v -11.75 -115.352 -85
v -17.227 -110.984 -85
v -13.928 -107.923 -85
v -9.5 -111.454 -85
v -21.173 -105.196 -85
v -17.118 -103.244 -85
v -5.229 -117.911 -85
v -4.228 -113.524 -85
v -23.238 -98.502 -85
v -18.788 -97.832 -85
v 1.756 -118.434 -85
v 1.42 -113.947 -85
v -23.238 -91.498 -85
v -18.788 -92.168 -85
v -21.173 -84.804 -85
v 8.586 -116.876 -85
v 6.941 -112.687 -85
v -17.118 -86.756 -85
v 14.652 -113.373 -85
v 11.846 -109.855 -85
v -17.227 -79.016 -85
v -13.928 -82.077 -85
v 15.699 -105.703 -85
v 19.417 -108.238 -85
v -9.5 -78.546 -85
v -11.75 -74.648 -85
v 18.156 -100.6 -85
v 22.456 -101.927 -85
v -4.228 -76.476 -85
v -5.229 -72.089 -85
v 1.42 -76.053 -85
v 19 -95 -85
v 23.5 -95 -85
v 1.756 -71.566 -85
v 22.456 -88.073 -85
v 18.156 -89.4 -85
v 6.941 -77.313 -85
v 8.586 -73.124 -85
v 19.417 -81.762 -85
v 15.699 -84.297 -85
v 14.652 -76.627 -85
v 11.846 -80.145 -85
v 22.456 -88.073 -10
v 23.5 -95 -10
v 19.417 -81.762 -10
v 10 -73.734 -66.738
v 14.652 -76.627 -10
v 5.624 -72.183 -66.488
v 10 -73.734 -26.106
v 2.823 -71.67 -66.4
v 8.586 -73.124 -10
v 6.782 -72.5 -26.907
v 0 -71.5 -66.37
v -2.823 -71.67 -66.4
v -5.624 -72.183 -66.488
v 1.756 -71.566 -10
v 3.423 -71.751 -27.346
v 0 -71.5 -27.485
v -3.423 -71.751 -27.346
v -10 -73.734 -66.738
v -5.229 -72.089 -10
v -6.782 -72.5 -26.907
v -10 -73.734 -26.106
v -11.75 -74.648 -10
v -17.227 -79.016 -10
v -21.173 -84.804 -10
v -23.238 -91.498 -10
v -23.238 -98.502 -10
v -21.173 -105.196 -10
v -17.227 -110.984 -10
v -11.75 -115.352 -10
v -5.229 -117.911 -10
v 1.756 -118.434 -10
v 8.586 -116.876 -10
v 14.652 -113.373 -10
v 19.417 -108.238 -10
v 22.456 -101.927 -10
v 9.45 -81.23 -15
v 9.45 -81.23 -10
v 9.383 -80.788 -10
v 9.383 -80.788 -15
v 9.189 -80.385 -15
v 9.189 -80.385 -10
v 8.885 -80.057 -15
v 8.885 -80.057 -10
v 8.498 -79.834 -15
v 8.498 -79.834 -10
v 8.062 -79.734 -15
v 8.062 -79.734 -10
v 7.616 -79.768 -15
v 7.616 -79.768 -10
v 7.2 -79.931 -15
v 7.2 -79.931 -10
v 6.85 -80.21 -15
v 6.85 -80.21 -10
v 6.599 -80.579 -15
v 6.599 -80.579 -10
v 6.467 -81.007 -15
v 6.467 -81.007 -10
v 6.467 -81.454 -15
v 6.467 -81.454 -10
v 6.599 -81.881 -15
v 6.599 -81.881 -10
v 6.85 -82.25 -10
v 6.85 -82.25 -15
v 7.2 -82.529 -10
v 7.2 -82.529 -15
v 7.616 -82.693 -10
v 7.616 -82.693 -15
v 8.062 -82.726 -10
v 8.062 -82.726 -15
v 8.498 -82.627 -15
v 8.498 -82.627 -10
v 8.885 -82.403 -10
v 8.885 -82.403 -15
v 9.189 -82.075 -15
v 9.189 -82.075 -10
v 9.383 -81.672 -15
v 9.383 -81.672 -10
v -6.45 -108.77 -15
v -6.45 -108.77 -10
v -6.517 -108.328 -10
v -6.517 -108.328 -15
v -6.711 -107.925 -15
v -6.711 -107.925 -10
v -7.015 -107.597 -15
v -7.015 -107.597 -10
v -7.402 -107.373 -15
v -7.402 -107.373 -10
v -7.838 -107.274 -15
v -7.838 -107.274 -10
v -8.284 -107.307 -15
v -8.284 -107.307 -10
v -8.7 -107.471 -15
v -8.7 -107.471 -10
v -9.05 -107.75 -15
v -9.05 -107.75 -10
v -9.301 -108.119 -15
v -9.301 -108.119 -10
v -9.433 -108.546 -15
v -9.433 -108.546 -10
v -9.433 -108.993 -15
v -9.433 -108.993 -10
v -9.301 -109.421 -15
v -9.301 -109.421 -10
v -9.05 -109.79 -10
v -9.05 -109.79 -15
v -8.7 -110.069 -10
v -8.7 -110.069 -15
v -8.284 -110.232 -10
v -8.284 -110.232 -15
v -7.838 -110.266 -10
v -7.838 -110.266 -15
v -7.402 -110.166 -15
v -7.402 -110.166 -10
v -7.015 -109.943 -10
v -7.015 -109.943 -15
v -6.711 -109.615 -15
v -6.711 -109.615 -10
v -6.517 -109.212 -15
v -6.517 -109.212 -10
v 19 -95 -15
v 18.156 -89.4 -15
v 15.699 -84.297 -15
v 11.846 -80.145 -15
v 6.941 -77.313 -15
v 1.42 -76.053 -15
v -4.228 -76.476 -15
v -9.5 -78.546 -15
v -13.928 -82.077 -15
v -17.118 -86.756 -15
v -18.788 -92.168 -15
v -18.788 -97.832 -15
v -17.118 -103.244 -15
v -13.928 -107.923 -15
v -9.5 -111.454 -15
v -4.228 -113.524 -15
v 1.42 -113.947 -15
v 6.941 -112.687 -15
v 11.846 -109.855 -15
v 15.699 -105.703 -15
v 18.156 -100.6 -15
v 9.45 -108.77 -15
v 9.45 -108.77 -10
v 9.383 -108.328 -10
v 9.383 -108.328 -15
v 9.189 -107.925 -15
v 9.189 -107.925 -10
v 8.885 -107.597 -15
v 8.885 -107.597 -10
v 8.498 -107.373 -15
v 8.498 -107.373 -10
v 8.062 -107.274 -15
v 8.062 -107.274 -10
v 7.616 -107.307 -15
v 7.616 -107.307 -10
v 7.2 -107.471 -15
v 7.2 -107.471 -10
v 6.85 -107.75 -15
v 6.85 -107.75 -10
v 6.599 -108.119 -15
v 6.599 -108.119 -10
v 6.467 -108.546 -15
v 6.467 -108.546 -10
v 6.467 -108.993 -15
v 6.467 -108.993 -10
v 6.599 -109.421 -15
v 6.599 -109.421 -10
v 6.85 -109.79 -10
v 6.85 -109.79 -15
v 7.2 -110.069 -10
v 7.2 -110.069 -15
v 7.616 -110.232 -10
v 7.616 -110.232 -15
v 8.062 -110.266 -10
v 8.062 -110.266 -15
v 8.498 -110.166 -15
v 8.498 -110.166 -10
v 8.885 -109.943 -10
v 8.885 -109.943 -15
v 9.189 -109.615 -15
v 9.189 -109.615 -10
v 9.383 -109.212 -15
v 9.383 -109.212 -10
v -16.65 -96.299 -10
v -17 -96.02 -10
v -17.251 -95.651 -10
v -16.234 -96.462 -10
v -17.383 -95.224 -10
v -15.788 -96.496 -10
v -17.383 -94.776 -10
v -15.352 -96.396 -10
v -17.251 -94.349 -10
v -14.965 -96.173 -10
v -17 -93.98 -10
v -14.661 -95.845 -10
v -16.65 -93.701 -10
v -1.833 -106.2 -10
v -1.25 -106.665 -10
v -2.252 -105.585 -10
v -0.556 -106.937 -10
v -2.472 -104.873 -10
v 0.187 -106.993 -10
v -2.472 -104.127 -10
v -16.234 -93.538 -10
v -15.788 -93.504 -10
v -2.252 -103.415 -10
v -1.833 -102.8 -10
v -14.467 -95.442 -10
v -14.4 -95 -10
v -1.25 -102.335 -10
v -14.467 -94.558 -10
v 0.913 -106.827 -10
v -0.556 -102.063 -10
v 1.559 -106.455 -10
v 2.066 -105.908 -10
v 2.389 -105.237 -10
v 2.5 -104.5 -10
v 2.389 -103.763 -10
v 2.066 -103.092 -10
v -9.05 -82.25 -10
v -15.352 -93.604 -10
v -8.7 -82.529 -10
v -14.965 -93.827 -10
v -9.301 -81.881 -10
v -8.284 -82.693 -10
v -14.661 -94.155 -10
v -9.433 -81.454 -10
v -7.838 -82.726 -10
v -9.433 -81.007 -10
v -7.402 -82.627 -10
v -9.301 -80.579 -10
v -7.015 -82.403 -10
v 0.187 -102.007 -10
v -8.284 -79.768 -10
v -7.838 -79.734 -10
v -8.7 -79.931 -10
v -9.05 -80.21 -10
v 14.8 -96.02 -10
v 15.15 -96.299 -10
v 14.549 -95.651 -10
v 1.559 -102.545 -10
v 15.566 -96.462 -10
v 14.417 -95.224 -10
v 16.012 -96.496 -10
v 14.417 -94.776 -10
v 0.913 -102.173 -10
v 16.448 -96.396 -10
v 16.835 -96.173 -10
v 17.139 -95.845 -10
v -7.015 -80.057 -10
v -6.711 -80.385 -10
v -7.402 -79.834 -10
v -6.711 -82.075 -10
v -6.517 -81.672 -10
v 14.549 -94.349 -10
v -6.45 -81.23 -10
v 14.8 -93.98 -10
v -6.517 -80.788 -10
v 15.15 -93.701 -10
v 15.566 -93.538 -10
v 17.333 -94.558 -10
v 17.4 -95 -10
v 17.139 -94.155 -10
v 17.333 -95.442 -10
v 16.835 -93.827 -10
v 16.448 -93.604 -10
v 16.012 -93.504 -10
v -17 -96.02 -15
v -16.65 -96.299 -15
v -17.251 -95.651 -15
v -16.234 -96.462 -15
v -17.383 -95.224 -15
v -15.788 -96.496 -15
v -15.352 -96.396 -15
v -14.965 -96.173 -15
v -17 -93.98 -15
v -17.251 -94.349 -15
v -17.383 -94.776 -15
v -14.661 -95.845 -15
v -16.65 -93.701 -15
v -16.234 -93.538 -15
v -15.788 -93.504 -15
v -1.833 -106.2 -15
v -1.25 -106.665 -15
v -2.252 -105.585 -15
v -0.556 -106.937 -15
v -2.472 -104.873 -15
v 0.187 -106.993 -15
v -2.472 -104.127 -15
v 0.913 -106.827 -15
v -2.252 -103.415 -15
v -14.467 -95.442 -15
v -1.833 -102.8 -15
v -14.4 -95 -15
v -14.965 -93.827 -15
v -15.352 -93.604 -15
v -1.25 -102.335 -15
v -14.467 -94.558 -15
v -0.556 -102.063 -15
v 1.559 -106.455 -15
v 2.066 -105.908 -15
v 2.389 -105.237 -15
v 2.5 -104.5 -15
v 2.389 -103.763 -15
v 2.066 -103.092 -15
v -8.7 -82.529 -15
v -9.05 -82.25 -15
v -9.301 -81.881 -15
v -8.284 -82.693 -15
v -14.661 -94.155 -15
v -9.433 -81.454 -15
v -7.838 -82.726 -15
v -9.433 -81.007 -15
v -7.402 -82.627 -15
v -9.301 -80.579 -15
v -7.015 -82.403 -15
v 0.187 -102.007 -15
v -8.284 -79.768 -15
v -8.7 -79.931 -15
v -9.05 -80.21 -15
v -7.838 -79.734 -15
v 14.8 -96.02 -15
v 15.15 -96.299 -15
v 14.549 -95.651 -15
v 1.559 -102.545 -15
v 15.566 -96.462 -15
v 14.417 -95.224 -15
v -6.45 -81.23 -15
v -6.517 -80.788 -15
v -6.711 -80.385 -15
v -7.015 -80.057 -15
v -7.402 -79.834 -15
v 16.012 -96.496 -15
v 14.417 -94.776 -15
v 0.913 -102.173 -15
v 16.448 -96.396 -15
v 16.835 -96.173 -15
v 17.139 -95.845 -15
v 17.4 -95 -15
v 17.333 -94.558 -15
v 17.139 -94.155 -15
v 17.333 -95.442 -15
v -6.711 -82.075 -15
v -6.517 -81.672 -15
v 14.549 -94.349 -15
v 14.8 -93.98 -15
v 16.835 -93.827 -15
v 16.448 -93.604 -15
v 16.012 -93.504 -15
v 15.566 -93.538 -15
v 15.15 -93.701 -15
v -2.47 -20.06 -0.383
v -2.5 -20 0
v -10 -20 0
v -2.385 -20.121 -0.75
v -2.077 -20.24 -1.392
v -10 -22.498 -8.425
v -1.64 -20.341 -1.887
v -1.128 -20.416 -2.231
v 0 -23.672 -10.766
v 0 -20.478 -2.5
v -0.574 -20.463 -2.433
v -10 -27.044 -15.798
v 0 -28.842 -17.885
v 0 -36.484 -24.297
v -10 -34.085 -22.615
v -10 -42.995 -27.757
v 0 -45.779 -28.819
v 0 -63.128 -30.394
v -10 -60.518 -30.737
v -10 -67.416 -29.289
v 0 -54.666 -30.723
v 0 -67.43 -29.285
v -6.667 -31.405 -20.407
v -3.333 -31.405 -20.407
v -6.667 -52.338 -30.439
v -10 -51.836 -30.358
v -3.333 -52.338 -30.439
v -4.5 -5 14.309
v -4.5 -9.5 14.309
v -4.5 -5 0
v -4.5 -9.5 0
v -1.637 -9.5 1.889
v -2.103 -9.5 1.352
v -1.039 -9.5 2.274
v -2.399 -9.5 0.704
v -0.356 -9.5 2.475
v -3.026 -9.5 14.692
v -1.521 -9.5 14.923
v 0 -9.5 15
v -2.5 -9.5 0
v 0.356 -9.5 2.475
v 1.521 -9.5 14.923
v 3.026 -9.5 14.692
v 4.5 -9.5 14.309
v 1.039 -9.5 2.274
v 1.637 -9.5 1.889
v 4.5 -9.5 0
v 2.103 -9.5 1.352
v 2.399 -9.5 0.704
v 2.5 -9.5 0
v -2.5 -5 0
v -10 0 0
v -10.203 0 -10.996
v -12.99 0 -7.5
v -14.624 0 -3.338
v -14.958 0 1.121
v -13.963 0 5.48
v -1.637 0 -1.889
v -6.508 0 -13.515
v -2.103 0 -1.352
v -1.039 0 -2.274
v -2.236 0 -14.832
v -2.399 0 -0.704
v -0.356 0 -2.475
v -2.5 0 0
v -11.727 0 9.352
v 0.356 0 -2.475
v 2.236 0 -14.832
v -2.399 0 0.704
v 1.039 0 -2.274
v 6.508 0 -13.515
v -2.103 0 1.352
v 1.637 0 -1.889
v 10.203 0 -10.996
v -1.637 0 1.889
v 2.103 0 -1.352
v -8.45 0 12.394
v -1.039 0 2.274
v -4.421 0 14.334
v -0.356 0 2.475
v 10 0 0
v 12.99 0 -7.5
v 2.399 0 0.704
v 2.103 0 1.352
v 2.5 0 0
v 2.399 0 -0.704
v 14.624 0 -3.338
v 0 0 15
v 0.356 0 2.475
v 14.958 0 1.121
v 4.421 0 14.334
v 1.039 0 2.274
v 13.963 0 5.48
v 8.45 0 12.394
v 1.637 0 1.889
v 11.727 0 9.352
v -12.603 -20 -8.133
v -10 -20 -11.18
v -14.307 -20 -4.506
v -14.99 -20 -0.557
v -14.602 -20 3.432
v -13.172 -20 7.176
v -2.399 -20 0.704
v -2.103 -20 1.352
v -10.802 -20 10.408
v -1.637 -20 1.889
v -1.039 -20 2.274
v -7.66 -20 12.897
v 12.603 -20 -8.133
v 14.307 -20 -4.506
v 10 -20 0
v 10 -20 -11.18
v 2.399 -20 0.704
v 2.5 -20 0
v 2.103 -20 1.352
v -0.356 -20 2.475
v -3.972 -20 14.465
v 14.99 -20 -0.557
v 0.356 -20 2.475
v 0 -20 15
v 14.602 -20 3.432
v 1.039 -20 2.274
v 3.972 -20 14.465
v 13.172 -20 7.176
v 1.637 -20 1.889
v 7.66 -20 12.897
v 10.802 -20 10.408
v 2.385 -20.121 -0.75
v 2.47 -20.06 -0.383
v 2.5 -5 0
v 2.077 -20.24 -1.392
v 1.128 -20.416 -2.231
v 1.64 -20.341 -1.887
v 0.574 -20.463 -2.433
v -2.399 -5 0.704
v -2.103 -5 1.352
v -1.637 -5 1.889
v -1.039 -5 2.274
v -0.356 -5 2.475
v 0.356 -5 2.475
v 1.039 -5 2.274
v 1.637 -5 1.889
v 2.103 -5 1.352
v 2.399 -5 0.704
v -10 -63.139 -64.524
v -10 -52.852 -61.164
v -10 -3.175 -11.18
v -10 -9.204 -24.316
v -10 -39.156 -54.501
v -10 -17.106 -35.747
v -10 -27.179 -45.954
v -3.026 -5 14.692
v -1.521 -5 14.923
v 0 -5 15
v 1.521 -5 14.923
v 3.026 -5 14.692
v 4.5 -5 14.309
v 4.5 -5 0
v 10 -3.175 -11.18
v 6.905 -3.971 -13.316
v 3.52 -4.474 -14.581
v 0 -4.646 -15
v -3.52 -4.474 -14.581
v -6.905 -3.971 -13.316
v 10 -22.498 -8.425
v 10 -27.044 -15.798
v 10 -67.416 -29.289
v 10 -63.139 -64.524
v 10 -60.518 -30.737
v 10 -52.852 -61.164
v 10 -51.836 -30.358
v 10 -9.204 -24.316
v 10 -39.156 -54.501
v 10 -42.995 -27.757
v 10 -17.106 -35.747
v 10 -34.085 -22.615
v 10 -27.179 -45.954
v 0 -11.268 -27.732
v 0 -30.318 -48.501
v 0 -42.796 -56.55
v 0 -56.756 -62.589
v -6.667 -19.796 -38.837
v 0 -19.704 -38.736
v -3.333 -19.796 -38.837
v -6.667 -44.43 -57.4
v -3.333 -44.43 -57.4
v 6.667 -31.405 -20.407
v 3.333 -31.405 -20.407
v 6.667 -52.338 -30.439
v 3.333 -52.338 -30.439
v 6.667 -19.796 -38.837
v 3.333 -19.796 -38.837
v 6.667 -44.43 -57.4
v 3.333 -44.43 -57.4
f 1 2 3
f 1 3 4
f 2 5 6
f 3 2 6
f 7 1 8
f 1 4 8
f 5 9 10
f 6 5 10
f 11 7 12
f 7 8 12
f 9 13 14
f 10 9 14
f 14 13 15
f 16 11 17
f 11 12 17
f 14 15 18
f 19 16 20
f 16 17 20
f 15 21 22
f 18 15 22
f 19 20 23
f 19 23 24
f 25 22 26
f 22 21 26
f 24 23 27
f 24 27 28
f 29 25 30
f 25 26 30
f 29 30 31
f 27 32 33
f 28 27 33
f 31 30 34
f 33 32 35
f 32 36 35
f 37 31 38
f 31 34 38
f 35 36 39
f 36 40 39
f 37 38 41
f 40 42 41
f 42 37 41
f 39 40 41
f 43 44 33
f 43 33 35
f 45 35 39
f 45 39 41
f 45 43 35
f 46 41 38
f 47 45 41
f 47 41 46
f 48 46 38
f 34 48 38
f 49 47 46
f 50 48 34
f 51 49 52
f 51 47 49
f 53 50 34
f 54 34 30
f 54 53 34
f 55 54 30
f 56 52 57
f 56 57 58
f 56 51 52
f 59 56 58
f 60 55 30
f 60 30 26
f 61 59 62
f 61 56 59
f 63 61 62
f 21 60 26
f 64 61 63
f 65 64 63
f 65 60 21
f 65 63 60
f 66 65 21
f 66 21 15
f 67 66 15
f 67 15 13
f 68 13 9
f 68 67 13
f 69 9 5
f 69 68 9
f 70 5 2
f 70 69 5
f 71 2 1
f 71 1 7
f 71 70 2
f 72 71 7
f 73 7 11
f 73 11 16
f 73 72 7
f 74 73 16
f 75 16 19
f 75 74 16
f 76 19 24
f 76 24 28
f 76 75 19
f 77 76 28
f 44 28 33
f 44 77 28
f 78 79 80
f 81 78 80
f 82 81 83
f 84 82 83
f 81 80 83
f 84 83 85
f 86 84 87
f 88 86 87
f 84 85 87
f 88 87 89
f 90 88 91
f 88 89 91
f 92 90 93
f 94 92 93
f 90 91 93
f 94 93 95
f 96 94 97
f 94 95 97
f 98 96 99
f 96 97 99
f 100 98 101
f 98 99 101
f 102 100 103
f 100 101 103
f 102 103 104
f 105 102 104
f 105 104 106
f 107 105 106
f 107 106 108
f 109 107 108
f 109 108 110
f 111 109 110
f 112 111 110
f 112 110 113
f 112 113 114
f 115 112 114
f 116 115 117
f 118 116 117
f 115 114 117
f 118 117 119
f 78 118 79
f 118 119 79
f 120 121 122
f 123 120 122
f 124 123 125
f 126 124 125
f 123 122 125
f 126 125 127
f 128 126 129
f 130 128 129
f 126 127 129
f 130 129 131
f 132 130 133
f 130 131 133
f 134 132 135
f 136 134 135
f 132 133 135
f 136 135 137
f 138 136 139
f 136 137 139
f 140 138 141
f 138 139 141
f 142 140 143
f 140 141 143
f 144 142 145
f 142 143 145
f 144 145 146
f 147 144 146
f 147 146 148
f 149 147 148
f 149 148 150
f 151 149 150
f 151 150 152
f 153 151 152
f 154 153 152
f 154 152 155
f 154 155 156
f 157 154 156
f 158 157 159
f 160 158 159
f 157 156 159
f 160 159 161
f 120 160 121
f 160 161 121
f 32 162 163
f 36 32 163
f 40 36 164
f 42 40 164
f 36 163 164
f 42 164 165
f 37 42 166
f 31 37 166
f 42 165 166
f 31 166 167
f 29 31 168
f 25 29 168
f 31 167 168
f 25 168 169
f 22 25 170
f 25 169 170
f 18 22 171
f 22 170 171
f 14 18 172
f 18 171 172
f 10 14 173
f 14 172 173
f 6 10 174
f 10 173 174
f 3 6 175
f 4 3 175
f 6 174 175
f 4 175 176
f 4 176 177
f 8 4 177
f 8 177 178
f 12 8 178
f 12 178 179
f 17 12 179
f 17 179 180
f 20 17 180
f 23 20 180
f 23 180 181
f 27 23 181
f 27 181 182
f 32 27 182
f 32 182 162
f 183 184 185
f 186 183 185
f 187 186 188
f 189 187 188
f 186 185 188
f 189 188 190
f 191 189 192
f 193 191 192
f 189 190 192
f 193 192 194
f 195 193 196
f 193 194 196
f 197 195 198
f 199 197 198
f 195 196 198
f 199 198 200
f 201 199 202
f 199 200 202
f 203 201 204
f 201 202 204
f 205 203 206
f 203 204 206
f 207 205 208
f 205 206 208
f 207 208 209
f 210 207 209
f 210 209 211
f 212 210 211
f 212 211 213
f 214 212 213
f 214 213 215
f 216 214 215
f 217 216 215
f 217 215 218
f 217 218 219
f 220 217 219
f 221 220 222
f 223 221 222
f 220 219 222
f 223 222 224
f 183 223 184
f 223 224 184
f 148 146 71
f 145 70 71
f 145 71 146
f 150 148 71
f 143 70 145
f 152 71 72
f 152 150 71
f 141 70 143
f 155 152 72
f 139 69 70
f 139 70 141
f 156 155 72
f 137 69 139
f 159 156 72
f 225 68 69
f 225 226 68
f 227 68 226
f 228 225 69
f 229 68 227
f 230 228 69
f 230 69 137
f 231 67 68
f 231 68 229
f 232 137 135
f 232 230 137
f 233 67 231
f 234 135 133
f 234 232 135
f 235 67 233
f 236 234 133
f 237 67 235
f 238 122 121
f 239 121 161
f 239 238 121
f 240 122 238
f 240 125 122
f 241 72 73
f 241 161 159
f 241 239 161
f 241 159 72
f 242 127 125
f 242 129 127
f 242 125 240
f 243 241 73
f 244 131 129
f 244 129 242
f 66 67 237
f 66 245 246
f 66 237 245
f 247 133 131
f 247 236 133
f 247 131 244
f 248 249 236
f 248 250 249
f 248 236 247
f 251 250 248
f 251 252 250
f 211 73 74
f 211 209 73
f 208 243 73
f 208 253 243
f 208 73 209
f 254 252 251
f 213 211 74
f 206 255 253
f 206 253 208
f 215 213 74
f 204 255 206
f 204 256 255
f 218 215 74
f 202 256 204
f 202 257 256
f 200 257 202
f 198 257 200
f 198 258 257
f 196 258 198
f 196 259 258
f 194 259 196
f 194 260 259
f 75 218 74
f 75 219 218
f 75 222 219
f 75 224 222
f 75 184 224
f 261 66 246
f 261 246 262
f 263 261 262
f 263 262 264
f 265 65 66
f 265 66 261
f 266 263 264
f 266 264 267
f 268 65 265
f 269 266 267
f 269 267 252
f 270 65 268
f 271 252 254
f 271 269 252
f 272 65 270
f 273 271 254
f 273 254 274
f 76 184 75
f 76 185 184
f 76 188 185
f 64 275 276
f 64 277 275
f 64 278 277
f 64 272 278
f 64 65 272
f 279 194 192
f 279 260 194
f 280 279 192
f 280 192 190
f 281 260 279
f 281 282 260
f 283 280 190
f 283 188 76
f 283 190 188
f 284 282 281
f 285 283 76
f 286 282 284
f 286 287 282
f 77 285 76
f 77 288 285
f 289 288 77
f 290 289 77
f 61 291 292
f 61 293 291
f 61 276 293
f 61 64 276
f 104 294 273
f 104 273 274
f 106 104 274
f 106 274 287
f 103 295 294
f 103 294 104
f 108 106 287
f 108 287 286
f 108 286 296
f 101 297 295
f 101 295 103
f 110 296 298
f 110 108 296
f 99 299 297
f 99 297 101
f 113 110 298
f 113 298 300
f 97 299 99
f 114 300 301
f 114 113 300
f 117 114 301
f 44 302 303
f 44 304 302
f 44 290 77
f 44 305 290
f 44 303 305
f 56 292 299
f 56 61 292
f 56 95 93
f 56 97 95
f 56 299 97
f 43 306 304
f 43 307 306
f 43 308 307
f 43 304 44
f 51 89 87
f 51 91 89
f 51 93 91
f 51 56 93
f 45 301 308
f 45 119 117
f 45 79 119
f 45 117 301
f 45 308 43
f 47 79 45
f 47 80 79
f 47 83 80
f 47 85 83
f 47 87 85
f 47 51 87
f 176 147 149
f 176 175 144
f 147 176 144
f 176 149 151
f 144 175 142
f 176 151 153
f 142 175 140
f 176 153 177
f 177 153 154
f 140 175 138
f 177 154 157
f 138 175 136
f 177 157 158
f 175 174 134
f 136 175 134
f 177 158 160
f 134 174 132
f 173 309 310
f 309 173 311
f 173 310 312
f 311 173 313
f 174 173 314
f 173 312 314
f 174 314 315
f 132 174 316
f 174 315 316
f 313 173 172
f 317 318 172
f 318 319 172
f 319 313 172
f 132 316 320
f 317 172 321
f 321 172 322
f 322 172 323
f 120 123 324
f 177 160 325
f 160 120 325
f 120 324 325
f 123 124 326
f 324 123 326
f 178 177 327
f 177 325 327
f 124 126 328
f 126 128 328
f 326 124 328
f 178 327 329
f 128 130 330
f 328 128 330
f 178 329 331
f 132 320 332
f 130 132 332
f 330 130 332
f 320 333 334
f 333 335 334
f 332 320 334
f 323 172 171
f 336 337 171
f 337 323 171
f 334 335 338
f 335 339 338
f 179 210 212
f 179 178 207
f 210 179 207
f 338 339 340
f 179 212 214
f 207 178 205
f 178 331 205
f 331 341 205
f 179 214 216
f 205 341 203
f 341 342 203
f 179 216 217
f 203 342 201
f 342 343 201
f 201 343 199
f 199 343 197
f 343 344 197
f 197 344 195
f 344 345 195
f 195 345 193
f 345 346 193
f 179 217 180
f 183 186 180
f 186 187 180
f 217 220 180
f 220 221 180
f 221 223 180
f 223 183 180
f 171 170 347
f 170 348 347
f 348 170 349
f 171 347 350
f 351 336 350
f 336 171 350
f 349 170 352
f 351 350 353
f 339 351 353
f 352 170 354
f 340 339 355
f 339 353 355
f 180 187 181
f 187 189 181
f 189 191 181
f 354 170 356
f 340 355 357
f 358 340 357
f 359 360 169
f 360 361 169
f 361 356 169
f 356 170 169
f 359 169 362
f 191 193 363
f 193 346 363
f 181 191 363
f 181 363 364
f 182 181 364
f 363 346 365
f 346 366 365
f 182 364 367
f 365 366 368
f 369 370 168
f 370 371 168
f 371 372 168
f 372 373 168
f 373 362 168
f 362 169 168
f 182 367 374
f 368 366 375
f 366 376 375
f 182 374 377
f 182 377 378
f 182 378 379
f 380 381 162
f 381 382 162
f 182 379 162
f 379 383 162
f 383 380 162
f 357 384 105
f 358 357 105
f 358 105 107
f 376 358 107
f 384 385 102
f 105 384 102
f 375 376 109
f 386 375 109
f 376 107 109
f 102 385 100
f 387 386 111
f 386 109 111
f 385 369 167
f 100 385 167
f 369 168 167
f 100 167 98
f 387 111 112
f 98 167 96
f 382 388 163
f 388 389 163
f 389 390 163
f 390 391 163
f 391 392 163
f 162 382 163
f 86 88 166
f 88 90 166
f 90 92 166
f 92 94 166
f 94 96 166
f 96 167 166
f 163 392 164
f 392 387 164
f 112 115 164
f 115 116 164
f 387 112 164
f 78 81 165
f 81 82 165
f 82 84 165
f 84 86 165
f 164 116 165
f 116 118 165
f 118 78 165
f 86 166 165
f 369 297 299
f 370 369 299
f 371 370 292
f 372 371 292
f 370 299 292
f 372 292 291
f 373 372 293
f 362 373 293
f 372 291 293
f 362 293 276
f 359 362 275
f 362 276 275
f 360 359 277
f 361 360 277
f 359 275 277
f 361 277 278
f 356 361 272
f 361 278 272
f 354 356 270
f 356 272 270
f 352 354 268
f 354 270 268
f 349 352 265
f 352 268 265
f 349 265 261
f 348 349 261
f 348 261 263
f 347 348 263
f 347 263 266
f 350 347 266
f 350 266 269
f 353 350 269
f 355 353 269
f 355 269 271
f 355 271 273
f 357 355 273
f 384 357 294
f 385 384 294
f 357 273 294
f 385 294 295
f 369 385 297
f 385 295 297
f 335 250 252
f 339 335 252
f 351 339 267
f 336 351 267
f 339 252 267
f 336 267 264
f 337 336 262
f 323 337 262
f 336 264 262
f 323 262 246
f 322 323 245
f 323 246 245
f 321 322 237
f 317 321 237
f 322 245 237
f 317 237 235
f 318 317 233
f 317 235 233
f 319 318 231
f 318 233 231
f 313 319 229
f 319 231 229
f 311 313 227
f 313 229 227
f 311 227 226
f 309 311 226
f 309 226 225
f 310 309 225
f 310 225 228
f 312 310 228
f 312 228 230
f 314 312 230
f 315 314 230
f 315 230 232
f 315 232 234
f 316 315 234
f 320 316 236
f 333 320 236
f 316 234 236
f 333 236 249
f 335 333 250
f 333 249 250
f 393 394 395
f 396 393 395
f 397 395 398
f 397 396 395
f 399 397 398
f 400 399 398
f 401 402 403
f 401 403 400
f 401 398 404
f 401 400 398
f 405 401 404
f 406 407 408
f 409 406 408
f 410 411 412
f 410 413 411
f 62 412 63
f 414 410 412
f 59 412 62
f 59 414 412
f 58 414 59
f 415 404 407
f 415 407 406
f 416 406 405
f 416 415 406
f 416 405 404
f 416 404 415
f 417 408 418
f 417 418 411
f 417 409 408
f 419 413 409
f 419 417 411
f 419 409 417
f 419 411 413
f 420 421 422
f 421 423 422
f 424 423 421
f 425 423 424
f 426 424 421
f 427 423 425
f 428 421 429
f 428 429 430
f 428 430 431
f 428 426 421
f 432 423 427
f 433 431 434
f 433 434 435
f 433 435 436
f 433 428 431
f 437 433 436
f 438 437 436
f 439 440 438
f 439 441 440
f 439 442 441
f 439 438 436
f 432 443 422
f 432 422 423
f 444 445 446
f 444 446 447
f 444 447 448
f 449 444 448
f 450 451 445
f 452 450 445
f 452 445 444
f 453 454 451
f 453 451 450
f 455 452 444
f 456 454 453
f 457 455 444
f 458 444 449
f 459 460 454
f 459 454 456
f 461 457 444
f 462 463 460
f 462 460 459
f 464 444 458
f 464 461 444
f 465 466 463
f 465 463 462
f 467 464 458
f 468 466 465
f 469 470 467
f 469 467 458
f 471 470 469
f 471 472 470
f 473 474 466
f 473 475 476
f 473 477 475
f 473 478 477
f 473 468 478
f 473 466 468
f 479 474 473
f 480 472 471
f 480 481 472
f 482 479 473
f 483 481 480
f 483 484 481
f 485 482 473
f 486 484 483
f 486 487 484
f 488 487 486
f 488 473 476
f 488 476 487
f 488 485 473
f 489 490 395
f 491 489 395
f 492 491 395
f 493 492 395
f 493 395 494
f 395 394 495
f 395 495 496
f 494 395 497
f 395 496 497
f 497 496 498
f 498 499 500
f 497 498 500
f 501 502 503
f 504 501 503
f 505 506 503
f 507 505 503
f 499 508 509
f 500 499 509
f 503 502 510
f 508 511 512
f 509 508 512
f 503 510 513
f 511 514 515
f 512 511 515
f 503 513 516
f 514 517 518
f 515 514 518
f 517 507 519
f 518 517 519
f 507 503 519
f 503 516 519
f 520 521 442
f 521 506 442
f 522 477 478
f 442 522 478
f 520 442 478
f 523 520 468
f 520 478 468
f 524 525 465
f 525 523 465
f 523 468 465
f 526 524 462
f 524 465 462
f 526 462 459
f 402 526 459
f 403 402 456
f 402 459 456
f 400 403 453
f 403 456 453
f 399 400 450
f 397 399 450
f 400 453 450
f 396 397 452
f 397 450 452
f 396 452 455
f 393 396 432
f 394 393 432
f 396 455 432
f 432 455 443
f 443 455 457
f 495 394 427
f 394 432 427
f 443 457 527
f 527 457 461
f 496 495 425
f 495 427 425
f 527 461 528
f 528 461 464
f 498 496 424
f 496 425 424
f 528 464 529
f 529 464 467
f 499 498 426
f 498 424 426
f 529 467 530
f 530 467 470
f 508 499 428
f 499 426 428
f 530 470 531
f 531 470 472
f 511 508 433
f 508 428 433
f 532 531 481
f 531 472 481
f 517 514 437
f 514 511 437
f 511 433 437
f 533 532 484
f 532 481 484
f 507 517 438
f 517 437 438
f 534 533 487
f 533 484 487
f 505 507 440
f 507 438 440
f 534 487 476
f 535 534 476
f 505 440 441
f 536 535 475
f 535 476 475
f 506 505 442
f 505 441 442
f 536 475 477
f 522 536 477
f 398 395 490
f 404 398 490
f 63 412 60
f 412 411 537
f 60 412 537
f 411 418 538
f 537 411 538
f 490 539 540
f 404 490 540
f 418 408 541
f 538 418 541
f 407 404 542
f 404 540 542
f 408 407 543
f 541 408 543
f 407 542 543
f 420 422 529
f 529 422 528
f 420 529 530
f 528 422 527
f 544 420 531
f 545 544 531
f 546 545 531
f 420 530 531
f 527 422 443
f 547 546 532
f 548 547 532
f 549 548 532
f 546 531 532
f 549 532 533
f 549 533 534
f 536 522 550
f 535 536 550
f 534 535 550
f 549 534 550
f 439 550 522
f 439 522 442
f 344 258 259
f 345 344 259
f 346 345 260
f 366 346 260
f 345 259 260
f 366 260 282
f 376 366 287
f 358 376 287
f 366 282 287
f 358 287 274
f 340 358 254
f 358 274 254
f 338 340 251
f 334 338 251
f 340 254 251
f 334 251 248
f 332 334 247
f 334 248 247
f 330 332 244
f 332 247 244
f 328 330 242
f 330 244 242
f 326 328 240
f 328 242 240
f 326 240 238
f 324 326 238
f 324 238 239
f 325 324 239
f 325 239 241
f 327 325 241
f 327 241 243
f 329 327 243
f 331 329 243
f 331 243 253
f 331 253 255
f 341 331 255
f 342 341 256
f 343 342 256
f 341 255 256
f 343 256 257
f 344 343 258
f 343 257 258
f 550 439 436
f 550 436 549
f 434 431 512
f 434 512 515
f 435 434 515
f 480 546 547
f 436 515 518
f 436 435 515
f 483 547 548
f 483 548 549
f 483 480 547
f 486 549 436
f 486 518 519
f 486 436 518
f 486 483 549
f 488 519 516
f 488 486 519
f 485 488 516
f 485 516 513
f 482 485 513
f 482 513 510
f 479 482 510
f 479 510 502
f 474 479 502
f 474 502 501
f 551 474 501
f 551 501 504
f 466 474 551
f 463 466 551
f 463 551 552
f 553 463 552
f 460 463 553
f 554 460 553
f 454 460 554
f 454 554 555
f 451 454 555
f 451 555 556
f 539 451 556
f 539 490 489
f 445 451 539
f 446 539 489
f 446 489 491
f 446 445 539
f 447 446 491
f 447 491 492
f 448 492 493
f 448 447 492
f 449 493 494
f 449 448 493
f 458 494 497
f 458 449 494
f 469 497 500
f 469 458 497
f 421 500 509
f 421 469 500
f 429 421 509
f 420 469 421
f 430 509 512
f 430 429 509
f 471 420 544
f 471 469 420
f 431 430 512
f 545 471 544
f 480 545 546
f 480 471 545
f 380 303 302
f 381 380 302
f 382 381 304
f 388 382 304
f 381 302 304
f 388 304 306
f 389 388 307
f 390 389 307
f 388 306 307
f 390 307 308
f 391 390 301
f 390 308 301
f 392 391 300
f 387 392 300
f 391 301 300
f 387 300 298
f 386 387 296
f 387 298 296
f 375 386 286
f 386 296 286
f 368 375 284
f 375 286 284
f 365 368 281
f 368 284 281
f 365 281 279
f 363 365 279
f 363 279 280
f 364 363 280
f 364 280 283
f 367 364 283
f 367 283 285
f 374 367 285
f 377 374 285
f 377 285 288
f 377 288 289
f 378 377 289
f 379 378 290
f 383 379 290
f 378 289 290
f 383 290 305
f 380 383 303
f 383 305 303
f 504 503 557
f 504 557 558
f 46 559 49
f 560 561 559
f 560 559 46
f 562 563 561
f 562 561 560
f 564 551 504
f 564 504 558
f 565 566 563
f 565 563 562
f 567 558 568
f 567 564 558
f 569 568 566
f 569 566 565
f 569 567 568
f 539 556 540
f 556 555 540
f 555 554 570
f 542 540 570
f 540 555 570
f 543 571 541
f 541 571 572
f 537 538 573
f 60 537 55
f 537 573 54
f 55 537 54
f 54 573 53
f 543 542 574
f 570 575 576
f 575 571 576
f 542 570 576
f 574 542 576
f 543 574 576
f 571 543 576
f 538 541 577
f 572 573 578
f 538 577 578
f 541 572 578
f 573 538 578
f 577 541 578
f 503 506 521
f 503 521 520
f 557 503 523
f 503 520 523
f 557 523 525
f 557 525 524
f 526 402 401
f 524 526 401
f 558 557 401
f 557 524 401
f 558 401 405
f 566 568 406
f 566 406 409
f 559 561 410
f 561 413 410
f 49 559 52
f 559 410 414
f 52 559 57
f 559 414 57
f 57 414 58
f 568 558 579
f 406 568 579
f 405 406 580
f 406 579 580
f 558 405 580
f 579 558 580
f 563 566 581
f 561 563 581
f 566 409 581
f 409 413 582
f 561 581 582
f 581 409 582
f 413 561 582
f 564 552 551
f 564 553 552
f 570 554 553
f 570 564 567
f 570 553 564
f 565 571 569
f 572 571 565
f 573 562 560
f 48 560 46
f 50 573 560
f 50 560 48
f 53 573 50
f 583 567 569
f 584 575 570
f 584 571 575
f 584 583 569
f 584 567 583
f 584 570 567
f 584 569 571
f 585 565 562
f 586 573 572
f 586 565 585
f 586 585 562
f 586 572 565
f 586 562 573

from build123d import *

# Parameters (mm, degrees)
SKETCH3_R           = 15
BOSS_EXTRUDE1_DEPTH = 20
SKETCH4_R           = 2.5
CUT_EXTRUDE1_DEPTH  = 30.154759474
CUT_EXTRUDE2_DEPTH  = 4.5
SKETCH7_W           = 9
SKETCH7_H           = 4.5
CUT_EXTRUDE3_DEPTH  = 30.154759474
BOSS_EXTRUDE3_DEPTH = 10
SKETCH9_R           = 2.5
CUT_EXTRUDE4_DEPTH  = 30
SKETCH12_R          = 23.5
BOSS_EXTRUDE6_DEPTH = 75
SKETCH13_R          = 19
CUT_EXTRUDE6_DEPTH  = 143.195288401
SKETCH14_R          = 19
BOSS_EXTRUDE7_DEPTH = 5
SKETCH15_R          = 1.5
SKETCH15_R_2        = 2.5
CUT_EXTRUDE8_DEPTH  = 5


with BuildPart() as part:
    # Sketch3 → Boss-Extrude1 (new body)
    with BuildSketch(Plane(origin=(0, 0, 0), x_dir=(1, 0, 0), z_dir=(0, 1, 0))):
        with Locations(Location((0, 0, 0), (0, 0, 270))):
            Circle(SKETCH3_R)
    extrude(amount=-BOSS_EXTRUDE1_DEPTH)

    # Sketch4 → Cut-Extrude1 (cut, through all)
    with BuildSketch(Plane(origin=(0, 0, 0), x_dir=(1, 0, 0), z_dir=(0, 1, 0))):
        with Locations(Location((0, 0, 0), (0, 0, 270))):
            Circle(SKETCH4_R)
    extrude(amount=-CUT_EXTRUDE1_DEPTH, mode=Mode.SUBTRACT)

    # Sketch6 → Cut-Extrude2 (cut)
    with BuildSketch(Plane(origin=(0, -5, 0), x_dir=(1, 0, 0), z_dir=(0, 1, 0))):
        Polygon((4.5, -2.598076211), (4.5, 2.598076211), (0, 5.196152423), (-4.5, 2.598076211), (-4.5, -2.598076211), (0, -5.196152423), align=None)
    extrude(amount=-CUT_EXTRUDE2_DEPTH, mode=Mode.SUBTRACT)

    # Sketch7 → Cut-Extrude3 (cut, through all)
    with BuildSketch(Plane.XY):
        with Locations((0, -7.25)):
            Rectangle(SKETCH7_W, SKETCH7_H)
    extrude(amount=CUT_EXTRUDE3_DEPTH, mode=Mode.SUBTRACT)

    # Sketch8 → Boss-Extrude3 (add, symmetric)
    with BuildSketch(Plane(origin=(0, 0, 0), x_dir=(0, 0, -1), z_dir=(1, 0, 0))):
        with BuildLine():
            Line((0, 0), (0, -20))
            add(Edge.make_bspline(
                [(0, -20), (27.284263103, -24.07033424), (42.456200025, -63.400009775), (20, -80)],
                knots=[0, 0, 0, 0, 1, 1, 1, 1], degree=3))
            Line((20, -80), (67.5, -80))
            add(Edge.make_bspline(
                [(0, 0), (41.415251378, -8.894775063), (64.240572417, -43.774170089), (67.5, -80)],
                knots=[0, 0, 0, 0, 1, 1, 1, 1], degree=3))
        make_face()
    extrude(amount=BOSS_EXTRUDE3_DEPTH, both=True)

    # Sketch9 → Cut-Extrude4 (cut)
    with BuildSketch(Plane(origin=(0, 0, 0), x_dir=(1, 0, 0), z_dir=(0, 1, 0))):
        with Locations(Location((0, 0, 0), (0, 0, 270))):
            Circle(SKETCH9_R)
    extrude(amount=-CUT_EXTRUDE4_DEPTH, mode=Mode.SUBTRACT)

    # Sketch12 → Boss-Extrude6 (add)
    with BuildSketch(Plane.XY.offset(-10)):
        with Locations((0, -95)):
            Circle(SKETCH12_R)
    extrude(amount=-BOSS_EXTRUDE6_DEPTH)

    # Sketch13 → Cut-Extrude6 (cut, through all)
    with BuildSketch(Plane.XY.offset(-10)):
        with Locations((0, -95)):
            Circle(SKETCH13_R)
    extrude(amount=-CUT_EXTRUDE6_DEPTH, mode=Mode.SUBTRACT)

    # Sketch14 → Boss-Extrude7 (add)
    with BuildSketch(Plane.XY.offset(-10)):
        with Locations((0, -95)):
            Circle(SKETCH14_R)
    extrude(amount=-BOSS_EXTRUDE7_DEPTH)

    # Sketch15 → Cut-Extrude8 (cut)
    with BuildSketch(Plane.XY.offset(-10)):
        with Locations((15.9, -95)):
            Circle(SKETCH15_R)
        with Locations((7.95, -108.76980392)):
            Circle(SKETCH15_R)
        with Locations((-7.95, -108.76980392)):
            Circle(SKETCH15_R)
        with Locations((-15.9, -95)):
            Circle(SKETCH15_R)
        with Locations((-7.95, -81.23019608)):
            Circle(SKETCH15_R)
        with Locations((7.95, -81.23019608)):
            Circle(SKETCH15_R)
        with Locations((0, -104.5)):
            Circle(SKETCH15_R_2)
    extrude(amount=-CUT_EXTRUDE8_DEPTH, mode=Mode.SUBTRACT)


solid = part.part
